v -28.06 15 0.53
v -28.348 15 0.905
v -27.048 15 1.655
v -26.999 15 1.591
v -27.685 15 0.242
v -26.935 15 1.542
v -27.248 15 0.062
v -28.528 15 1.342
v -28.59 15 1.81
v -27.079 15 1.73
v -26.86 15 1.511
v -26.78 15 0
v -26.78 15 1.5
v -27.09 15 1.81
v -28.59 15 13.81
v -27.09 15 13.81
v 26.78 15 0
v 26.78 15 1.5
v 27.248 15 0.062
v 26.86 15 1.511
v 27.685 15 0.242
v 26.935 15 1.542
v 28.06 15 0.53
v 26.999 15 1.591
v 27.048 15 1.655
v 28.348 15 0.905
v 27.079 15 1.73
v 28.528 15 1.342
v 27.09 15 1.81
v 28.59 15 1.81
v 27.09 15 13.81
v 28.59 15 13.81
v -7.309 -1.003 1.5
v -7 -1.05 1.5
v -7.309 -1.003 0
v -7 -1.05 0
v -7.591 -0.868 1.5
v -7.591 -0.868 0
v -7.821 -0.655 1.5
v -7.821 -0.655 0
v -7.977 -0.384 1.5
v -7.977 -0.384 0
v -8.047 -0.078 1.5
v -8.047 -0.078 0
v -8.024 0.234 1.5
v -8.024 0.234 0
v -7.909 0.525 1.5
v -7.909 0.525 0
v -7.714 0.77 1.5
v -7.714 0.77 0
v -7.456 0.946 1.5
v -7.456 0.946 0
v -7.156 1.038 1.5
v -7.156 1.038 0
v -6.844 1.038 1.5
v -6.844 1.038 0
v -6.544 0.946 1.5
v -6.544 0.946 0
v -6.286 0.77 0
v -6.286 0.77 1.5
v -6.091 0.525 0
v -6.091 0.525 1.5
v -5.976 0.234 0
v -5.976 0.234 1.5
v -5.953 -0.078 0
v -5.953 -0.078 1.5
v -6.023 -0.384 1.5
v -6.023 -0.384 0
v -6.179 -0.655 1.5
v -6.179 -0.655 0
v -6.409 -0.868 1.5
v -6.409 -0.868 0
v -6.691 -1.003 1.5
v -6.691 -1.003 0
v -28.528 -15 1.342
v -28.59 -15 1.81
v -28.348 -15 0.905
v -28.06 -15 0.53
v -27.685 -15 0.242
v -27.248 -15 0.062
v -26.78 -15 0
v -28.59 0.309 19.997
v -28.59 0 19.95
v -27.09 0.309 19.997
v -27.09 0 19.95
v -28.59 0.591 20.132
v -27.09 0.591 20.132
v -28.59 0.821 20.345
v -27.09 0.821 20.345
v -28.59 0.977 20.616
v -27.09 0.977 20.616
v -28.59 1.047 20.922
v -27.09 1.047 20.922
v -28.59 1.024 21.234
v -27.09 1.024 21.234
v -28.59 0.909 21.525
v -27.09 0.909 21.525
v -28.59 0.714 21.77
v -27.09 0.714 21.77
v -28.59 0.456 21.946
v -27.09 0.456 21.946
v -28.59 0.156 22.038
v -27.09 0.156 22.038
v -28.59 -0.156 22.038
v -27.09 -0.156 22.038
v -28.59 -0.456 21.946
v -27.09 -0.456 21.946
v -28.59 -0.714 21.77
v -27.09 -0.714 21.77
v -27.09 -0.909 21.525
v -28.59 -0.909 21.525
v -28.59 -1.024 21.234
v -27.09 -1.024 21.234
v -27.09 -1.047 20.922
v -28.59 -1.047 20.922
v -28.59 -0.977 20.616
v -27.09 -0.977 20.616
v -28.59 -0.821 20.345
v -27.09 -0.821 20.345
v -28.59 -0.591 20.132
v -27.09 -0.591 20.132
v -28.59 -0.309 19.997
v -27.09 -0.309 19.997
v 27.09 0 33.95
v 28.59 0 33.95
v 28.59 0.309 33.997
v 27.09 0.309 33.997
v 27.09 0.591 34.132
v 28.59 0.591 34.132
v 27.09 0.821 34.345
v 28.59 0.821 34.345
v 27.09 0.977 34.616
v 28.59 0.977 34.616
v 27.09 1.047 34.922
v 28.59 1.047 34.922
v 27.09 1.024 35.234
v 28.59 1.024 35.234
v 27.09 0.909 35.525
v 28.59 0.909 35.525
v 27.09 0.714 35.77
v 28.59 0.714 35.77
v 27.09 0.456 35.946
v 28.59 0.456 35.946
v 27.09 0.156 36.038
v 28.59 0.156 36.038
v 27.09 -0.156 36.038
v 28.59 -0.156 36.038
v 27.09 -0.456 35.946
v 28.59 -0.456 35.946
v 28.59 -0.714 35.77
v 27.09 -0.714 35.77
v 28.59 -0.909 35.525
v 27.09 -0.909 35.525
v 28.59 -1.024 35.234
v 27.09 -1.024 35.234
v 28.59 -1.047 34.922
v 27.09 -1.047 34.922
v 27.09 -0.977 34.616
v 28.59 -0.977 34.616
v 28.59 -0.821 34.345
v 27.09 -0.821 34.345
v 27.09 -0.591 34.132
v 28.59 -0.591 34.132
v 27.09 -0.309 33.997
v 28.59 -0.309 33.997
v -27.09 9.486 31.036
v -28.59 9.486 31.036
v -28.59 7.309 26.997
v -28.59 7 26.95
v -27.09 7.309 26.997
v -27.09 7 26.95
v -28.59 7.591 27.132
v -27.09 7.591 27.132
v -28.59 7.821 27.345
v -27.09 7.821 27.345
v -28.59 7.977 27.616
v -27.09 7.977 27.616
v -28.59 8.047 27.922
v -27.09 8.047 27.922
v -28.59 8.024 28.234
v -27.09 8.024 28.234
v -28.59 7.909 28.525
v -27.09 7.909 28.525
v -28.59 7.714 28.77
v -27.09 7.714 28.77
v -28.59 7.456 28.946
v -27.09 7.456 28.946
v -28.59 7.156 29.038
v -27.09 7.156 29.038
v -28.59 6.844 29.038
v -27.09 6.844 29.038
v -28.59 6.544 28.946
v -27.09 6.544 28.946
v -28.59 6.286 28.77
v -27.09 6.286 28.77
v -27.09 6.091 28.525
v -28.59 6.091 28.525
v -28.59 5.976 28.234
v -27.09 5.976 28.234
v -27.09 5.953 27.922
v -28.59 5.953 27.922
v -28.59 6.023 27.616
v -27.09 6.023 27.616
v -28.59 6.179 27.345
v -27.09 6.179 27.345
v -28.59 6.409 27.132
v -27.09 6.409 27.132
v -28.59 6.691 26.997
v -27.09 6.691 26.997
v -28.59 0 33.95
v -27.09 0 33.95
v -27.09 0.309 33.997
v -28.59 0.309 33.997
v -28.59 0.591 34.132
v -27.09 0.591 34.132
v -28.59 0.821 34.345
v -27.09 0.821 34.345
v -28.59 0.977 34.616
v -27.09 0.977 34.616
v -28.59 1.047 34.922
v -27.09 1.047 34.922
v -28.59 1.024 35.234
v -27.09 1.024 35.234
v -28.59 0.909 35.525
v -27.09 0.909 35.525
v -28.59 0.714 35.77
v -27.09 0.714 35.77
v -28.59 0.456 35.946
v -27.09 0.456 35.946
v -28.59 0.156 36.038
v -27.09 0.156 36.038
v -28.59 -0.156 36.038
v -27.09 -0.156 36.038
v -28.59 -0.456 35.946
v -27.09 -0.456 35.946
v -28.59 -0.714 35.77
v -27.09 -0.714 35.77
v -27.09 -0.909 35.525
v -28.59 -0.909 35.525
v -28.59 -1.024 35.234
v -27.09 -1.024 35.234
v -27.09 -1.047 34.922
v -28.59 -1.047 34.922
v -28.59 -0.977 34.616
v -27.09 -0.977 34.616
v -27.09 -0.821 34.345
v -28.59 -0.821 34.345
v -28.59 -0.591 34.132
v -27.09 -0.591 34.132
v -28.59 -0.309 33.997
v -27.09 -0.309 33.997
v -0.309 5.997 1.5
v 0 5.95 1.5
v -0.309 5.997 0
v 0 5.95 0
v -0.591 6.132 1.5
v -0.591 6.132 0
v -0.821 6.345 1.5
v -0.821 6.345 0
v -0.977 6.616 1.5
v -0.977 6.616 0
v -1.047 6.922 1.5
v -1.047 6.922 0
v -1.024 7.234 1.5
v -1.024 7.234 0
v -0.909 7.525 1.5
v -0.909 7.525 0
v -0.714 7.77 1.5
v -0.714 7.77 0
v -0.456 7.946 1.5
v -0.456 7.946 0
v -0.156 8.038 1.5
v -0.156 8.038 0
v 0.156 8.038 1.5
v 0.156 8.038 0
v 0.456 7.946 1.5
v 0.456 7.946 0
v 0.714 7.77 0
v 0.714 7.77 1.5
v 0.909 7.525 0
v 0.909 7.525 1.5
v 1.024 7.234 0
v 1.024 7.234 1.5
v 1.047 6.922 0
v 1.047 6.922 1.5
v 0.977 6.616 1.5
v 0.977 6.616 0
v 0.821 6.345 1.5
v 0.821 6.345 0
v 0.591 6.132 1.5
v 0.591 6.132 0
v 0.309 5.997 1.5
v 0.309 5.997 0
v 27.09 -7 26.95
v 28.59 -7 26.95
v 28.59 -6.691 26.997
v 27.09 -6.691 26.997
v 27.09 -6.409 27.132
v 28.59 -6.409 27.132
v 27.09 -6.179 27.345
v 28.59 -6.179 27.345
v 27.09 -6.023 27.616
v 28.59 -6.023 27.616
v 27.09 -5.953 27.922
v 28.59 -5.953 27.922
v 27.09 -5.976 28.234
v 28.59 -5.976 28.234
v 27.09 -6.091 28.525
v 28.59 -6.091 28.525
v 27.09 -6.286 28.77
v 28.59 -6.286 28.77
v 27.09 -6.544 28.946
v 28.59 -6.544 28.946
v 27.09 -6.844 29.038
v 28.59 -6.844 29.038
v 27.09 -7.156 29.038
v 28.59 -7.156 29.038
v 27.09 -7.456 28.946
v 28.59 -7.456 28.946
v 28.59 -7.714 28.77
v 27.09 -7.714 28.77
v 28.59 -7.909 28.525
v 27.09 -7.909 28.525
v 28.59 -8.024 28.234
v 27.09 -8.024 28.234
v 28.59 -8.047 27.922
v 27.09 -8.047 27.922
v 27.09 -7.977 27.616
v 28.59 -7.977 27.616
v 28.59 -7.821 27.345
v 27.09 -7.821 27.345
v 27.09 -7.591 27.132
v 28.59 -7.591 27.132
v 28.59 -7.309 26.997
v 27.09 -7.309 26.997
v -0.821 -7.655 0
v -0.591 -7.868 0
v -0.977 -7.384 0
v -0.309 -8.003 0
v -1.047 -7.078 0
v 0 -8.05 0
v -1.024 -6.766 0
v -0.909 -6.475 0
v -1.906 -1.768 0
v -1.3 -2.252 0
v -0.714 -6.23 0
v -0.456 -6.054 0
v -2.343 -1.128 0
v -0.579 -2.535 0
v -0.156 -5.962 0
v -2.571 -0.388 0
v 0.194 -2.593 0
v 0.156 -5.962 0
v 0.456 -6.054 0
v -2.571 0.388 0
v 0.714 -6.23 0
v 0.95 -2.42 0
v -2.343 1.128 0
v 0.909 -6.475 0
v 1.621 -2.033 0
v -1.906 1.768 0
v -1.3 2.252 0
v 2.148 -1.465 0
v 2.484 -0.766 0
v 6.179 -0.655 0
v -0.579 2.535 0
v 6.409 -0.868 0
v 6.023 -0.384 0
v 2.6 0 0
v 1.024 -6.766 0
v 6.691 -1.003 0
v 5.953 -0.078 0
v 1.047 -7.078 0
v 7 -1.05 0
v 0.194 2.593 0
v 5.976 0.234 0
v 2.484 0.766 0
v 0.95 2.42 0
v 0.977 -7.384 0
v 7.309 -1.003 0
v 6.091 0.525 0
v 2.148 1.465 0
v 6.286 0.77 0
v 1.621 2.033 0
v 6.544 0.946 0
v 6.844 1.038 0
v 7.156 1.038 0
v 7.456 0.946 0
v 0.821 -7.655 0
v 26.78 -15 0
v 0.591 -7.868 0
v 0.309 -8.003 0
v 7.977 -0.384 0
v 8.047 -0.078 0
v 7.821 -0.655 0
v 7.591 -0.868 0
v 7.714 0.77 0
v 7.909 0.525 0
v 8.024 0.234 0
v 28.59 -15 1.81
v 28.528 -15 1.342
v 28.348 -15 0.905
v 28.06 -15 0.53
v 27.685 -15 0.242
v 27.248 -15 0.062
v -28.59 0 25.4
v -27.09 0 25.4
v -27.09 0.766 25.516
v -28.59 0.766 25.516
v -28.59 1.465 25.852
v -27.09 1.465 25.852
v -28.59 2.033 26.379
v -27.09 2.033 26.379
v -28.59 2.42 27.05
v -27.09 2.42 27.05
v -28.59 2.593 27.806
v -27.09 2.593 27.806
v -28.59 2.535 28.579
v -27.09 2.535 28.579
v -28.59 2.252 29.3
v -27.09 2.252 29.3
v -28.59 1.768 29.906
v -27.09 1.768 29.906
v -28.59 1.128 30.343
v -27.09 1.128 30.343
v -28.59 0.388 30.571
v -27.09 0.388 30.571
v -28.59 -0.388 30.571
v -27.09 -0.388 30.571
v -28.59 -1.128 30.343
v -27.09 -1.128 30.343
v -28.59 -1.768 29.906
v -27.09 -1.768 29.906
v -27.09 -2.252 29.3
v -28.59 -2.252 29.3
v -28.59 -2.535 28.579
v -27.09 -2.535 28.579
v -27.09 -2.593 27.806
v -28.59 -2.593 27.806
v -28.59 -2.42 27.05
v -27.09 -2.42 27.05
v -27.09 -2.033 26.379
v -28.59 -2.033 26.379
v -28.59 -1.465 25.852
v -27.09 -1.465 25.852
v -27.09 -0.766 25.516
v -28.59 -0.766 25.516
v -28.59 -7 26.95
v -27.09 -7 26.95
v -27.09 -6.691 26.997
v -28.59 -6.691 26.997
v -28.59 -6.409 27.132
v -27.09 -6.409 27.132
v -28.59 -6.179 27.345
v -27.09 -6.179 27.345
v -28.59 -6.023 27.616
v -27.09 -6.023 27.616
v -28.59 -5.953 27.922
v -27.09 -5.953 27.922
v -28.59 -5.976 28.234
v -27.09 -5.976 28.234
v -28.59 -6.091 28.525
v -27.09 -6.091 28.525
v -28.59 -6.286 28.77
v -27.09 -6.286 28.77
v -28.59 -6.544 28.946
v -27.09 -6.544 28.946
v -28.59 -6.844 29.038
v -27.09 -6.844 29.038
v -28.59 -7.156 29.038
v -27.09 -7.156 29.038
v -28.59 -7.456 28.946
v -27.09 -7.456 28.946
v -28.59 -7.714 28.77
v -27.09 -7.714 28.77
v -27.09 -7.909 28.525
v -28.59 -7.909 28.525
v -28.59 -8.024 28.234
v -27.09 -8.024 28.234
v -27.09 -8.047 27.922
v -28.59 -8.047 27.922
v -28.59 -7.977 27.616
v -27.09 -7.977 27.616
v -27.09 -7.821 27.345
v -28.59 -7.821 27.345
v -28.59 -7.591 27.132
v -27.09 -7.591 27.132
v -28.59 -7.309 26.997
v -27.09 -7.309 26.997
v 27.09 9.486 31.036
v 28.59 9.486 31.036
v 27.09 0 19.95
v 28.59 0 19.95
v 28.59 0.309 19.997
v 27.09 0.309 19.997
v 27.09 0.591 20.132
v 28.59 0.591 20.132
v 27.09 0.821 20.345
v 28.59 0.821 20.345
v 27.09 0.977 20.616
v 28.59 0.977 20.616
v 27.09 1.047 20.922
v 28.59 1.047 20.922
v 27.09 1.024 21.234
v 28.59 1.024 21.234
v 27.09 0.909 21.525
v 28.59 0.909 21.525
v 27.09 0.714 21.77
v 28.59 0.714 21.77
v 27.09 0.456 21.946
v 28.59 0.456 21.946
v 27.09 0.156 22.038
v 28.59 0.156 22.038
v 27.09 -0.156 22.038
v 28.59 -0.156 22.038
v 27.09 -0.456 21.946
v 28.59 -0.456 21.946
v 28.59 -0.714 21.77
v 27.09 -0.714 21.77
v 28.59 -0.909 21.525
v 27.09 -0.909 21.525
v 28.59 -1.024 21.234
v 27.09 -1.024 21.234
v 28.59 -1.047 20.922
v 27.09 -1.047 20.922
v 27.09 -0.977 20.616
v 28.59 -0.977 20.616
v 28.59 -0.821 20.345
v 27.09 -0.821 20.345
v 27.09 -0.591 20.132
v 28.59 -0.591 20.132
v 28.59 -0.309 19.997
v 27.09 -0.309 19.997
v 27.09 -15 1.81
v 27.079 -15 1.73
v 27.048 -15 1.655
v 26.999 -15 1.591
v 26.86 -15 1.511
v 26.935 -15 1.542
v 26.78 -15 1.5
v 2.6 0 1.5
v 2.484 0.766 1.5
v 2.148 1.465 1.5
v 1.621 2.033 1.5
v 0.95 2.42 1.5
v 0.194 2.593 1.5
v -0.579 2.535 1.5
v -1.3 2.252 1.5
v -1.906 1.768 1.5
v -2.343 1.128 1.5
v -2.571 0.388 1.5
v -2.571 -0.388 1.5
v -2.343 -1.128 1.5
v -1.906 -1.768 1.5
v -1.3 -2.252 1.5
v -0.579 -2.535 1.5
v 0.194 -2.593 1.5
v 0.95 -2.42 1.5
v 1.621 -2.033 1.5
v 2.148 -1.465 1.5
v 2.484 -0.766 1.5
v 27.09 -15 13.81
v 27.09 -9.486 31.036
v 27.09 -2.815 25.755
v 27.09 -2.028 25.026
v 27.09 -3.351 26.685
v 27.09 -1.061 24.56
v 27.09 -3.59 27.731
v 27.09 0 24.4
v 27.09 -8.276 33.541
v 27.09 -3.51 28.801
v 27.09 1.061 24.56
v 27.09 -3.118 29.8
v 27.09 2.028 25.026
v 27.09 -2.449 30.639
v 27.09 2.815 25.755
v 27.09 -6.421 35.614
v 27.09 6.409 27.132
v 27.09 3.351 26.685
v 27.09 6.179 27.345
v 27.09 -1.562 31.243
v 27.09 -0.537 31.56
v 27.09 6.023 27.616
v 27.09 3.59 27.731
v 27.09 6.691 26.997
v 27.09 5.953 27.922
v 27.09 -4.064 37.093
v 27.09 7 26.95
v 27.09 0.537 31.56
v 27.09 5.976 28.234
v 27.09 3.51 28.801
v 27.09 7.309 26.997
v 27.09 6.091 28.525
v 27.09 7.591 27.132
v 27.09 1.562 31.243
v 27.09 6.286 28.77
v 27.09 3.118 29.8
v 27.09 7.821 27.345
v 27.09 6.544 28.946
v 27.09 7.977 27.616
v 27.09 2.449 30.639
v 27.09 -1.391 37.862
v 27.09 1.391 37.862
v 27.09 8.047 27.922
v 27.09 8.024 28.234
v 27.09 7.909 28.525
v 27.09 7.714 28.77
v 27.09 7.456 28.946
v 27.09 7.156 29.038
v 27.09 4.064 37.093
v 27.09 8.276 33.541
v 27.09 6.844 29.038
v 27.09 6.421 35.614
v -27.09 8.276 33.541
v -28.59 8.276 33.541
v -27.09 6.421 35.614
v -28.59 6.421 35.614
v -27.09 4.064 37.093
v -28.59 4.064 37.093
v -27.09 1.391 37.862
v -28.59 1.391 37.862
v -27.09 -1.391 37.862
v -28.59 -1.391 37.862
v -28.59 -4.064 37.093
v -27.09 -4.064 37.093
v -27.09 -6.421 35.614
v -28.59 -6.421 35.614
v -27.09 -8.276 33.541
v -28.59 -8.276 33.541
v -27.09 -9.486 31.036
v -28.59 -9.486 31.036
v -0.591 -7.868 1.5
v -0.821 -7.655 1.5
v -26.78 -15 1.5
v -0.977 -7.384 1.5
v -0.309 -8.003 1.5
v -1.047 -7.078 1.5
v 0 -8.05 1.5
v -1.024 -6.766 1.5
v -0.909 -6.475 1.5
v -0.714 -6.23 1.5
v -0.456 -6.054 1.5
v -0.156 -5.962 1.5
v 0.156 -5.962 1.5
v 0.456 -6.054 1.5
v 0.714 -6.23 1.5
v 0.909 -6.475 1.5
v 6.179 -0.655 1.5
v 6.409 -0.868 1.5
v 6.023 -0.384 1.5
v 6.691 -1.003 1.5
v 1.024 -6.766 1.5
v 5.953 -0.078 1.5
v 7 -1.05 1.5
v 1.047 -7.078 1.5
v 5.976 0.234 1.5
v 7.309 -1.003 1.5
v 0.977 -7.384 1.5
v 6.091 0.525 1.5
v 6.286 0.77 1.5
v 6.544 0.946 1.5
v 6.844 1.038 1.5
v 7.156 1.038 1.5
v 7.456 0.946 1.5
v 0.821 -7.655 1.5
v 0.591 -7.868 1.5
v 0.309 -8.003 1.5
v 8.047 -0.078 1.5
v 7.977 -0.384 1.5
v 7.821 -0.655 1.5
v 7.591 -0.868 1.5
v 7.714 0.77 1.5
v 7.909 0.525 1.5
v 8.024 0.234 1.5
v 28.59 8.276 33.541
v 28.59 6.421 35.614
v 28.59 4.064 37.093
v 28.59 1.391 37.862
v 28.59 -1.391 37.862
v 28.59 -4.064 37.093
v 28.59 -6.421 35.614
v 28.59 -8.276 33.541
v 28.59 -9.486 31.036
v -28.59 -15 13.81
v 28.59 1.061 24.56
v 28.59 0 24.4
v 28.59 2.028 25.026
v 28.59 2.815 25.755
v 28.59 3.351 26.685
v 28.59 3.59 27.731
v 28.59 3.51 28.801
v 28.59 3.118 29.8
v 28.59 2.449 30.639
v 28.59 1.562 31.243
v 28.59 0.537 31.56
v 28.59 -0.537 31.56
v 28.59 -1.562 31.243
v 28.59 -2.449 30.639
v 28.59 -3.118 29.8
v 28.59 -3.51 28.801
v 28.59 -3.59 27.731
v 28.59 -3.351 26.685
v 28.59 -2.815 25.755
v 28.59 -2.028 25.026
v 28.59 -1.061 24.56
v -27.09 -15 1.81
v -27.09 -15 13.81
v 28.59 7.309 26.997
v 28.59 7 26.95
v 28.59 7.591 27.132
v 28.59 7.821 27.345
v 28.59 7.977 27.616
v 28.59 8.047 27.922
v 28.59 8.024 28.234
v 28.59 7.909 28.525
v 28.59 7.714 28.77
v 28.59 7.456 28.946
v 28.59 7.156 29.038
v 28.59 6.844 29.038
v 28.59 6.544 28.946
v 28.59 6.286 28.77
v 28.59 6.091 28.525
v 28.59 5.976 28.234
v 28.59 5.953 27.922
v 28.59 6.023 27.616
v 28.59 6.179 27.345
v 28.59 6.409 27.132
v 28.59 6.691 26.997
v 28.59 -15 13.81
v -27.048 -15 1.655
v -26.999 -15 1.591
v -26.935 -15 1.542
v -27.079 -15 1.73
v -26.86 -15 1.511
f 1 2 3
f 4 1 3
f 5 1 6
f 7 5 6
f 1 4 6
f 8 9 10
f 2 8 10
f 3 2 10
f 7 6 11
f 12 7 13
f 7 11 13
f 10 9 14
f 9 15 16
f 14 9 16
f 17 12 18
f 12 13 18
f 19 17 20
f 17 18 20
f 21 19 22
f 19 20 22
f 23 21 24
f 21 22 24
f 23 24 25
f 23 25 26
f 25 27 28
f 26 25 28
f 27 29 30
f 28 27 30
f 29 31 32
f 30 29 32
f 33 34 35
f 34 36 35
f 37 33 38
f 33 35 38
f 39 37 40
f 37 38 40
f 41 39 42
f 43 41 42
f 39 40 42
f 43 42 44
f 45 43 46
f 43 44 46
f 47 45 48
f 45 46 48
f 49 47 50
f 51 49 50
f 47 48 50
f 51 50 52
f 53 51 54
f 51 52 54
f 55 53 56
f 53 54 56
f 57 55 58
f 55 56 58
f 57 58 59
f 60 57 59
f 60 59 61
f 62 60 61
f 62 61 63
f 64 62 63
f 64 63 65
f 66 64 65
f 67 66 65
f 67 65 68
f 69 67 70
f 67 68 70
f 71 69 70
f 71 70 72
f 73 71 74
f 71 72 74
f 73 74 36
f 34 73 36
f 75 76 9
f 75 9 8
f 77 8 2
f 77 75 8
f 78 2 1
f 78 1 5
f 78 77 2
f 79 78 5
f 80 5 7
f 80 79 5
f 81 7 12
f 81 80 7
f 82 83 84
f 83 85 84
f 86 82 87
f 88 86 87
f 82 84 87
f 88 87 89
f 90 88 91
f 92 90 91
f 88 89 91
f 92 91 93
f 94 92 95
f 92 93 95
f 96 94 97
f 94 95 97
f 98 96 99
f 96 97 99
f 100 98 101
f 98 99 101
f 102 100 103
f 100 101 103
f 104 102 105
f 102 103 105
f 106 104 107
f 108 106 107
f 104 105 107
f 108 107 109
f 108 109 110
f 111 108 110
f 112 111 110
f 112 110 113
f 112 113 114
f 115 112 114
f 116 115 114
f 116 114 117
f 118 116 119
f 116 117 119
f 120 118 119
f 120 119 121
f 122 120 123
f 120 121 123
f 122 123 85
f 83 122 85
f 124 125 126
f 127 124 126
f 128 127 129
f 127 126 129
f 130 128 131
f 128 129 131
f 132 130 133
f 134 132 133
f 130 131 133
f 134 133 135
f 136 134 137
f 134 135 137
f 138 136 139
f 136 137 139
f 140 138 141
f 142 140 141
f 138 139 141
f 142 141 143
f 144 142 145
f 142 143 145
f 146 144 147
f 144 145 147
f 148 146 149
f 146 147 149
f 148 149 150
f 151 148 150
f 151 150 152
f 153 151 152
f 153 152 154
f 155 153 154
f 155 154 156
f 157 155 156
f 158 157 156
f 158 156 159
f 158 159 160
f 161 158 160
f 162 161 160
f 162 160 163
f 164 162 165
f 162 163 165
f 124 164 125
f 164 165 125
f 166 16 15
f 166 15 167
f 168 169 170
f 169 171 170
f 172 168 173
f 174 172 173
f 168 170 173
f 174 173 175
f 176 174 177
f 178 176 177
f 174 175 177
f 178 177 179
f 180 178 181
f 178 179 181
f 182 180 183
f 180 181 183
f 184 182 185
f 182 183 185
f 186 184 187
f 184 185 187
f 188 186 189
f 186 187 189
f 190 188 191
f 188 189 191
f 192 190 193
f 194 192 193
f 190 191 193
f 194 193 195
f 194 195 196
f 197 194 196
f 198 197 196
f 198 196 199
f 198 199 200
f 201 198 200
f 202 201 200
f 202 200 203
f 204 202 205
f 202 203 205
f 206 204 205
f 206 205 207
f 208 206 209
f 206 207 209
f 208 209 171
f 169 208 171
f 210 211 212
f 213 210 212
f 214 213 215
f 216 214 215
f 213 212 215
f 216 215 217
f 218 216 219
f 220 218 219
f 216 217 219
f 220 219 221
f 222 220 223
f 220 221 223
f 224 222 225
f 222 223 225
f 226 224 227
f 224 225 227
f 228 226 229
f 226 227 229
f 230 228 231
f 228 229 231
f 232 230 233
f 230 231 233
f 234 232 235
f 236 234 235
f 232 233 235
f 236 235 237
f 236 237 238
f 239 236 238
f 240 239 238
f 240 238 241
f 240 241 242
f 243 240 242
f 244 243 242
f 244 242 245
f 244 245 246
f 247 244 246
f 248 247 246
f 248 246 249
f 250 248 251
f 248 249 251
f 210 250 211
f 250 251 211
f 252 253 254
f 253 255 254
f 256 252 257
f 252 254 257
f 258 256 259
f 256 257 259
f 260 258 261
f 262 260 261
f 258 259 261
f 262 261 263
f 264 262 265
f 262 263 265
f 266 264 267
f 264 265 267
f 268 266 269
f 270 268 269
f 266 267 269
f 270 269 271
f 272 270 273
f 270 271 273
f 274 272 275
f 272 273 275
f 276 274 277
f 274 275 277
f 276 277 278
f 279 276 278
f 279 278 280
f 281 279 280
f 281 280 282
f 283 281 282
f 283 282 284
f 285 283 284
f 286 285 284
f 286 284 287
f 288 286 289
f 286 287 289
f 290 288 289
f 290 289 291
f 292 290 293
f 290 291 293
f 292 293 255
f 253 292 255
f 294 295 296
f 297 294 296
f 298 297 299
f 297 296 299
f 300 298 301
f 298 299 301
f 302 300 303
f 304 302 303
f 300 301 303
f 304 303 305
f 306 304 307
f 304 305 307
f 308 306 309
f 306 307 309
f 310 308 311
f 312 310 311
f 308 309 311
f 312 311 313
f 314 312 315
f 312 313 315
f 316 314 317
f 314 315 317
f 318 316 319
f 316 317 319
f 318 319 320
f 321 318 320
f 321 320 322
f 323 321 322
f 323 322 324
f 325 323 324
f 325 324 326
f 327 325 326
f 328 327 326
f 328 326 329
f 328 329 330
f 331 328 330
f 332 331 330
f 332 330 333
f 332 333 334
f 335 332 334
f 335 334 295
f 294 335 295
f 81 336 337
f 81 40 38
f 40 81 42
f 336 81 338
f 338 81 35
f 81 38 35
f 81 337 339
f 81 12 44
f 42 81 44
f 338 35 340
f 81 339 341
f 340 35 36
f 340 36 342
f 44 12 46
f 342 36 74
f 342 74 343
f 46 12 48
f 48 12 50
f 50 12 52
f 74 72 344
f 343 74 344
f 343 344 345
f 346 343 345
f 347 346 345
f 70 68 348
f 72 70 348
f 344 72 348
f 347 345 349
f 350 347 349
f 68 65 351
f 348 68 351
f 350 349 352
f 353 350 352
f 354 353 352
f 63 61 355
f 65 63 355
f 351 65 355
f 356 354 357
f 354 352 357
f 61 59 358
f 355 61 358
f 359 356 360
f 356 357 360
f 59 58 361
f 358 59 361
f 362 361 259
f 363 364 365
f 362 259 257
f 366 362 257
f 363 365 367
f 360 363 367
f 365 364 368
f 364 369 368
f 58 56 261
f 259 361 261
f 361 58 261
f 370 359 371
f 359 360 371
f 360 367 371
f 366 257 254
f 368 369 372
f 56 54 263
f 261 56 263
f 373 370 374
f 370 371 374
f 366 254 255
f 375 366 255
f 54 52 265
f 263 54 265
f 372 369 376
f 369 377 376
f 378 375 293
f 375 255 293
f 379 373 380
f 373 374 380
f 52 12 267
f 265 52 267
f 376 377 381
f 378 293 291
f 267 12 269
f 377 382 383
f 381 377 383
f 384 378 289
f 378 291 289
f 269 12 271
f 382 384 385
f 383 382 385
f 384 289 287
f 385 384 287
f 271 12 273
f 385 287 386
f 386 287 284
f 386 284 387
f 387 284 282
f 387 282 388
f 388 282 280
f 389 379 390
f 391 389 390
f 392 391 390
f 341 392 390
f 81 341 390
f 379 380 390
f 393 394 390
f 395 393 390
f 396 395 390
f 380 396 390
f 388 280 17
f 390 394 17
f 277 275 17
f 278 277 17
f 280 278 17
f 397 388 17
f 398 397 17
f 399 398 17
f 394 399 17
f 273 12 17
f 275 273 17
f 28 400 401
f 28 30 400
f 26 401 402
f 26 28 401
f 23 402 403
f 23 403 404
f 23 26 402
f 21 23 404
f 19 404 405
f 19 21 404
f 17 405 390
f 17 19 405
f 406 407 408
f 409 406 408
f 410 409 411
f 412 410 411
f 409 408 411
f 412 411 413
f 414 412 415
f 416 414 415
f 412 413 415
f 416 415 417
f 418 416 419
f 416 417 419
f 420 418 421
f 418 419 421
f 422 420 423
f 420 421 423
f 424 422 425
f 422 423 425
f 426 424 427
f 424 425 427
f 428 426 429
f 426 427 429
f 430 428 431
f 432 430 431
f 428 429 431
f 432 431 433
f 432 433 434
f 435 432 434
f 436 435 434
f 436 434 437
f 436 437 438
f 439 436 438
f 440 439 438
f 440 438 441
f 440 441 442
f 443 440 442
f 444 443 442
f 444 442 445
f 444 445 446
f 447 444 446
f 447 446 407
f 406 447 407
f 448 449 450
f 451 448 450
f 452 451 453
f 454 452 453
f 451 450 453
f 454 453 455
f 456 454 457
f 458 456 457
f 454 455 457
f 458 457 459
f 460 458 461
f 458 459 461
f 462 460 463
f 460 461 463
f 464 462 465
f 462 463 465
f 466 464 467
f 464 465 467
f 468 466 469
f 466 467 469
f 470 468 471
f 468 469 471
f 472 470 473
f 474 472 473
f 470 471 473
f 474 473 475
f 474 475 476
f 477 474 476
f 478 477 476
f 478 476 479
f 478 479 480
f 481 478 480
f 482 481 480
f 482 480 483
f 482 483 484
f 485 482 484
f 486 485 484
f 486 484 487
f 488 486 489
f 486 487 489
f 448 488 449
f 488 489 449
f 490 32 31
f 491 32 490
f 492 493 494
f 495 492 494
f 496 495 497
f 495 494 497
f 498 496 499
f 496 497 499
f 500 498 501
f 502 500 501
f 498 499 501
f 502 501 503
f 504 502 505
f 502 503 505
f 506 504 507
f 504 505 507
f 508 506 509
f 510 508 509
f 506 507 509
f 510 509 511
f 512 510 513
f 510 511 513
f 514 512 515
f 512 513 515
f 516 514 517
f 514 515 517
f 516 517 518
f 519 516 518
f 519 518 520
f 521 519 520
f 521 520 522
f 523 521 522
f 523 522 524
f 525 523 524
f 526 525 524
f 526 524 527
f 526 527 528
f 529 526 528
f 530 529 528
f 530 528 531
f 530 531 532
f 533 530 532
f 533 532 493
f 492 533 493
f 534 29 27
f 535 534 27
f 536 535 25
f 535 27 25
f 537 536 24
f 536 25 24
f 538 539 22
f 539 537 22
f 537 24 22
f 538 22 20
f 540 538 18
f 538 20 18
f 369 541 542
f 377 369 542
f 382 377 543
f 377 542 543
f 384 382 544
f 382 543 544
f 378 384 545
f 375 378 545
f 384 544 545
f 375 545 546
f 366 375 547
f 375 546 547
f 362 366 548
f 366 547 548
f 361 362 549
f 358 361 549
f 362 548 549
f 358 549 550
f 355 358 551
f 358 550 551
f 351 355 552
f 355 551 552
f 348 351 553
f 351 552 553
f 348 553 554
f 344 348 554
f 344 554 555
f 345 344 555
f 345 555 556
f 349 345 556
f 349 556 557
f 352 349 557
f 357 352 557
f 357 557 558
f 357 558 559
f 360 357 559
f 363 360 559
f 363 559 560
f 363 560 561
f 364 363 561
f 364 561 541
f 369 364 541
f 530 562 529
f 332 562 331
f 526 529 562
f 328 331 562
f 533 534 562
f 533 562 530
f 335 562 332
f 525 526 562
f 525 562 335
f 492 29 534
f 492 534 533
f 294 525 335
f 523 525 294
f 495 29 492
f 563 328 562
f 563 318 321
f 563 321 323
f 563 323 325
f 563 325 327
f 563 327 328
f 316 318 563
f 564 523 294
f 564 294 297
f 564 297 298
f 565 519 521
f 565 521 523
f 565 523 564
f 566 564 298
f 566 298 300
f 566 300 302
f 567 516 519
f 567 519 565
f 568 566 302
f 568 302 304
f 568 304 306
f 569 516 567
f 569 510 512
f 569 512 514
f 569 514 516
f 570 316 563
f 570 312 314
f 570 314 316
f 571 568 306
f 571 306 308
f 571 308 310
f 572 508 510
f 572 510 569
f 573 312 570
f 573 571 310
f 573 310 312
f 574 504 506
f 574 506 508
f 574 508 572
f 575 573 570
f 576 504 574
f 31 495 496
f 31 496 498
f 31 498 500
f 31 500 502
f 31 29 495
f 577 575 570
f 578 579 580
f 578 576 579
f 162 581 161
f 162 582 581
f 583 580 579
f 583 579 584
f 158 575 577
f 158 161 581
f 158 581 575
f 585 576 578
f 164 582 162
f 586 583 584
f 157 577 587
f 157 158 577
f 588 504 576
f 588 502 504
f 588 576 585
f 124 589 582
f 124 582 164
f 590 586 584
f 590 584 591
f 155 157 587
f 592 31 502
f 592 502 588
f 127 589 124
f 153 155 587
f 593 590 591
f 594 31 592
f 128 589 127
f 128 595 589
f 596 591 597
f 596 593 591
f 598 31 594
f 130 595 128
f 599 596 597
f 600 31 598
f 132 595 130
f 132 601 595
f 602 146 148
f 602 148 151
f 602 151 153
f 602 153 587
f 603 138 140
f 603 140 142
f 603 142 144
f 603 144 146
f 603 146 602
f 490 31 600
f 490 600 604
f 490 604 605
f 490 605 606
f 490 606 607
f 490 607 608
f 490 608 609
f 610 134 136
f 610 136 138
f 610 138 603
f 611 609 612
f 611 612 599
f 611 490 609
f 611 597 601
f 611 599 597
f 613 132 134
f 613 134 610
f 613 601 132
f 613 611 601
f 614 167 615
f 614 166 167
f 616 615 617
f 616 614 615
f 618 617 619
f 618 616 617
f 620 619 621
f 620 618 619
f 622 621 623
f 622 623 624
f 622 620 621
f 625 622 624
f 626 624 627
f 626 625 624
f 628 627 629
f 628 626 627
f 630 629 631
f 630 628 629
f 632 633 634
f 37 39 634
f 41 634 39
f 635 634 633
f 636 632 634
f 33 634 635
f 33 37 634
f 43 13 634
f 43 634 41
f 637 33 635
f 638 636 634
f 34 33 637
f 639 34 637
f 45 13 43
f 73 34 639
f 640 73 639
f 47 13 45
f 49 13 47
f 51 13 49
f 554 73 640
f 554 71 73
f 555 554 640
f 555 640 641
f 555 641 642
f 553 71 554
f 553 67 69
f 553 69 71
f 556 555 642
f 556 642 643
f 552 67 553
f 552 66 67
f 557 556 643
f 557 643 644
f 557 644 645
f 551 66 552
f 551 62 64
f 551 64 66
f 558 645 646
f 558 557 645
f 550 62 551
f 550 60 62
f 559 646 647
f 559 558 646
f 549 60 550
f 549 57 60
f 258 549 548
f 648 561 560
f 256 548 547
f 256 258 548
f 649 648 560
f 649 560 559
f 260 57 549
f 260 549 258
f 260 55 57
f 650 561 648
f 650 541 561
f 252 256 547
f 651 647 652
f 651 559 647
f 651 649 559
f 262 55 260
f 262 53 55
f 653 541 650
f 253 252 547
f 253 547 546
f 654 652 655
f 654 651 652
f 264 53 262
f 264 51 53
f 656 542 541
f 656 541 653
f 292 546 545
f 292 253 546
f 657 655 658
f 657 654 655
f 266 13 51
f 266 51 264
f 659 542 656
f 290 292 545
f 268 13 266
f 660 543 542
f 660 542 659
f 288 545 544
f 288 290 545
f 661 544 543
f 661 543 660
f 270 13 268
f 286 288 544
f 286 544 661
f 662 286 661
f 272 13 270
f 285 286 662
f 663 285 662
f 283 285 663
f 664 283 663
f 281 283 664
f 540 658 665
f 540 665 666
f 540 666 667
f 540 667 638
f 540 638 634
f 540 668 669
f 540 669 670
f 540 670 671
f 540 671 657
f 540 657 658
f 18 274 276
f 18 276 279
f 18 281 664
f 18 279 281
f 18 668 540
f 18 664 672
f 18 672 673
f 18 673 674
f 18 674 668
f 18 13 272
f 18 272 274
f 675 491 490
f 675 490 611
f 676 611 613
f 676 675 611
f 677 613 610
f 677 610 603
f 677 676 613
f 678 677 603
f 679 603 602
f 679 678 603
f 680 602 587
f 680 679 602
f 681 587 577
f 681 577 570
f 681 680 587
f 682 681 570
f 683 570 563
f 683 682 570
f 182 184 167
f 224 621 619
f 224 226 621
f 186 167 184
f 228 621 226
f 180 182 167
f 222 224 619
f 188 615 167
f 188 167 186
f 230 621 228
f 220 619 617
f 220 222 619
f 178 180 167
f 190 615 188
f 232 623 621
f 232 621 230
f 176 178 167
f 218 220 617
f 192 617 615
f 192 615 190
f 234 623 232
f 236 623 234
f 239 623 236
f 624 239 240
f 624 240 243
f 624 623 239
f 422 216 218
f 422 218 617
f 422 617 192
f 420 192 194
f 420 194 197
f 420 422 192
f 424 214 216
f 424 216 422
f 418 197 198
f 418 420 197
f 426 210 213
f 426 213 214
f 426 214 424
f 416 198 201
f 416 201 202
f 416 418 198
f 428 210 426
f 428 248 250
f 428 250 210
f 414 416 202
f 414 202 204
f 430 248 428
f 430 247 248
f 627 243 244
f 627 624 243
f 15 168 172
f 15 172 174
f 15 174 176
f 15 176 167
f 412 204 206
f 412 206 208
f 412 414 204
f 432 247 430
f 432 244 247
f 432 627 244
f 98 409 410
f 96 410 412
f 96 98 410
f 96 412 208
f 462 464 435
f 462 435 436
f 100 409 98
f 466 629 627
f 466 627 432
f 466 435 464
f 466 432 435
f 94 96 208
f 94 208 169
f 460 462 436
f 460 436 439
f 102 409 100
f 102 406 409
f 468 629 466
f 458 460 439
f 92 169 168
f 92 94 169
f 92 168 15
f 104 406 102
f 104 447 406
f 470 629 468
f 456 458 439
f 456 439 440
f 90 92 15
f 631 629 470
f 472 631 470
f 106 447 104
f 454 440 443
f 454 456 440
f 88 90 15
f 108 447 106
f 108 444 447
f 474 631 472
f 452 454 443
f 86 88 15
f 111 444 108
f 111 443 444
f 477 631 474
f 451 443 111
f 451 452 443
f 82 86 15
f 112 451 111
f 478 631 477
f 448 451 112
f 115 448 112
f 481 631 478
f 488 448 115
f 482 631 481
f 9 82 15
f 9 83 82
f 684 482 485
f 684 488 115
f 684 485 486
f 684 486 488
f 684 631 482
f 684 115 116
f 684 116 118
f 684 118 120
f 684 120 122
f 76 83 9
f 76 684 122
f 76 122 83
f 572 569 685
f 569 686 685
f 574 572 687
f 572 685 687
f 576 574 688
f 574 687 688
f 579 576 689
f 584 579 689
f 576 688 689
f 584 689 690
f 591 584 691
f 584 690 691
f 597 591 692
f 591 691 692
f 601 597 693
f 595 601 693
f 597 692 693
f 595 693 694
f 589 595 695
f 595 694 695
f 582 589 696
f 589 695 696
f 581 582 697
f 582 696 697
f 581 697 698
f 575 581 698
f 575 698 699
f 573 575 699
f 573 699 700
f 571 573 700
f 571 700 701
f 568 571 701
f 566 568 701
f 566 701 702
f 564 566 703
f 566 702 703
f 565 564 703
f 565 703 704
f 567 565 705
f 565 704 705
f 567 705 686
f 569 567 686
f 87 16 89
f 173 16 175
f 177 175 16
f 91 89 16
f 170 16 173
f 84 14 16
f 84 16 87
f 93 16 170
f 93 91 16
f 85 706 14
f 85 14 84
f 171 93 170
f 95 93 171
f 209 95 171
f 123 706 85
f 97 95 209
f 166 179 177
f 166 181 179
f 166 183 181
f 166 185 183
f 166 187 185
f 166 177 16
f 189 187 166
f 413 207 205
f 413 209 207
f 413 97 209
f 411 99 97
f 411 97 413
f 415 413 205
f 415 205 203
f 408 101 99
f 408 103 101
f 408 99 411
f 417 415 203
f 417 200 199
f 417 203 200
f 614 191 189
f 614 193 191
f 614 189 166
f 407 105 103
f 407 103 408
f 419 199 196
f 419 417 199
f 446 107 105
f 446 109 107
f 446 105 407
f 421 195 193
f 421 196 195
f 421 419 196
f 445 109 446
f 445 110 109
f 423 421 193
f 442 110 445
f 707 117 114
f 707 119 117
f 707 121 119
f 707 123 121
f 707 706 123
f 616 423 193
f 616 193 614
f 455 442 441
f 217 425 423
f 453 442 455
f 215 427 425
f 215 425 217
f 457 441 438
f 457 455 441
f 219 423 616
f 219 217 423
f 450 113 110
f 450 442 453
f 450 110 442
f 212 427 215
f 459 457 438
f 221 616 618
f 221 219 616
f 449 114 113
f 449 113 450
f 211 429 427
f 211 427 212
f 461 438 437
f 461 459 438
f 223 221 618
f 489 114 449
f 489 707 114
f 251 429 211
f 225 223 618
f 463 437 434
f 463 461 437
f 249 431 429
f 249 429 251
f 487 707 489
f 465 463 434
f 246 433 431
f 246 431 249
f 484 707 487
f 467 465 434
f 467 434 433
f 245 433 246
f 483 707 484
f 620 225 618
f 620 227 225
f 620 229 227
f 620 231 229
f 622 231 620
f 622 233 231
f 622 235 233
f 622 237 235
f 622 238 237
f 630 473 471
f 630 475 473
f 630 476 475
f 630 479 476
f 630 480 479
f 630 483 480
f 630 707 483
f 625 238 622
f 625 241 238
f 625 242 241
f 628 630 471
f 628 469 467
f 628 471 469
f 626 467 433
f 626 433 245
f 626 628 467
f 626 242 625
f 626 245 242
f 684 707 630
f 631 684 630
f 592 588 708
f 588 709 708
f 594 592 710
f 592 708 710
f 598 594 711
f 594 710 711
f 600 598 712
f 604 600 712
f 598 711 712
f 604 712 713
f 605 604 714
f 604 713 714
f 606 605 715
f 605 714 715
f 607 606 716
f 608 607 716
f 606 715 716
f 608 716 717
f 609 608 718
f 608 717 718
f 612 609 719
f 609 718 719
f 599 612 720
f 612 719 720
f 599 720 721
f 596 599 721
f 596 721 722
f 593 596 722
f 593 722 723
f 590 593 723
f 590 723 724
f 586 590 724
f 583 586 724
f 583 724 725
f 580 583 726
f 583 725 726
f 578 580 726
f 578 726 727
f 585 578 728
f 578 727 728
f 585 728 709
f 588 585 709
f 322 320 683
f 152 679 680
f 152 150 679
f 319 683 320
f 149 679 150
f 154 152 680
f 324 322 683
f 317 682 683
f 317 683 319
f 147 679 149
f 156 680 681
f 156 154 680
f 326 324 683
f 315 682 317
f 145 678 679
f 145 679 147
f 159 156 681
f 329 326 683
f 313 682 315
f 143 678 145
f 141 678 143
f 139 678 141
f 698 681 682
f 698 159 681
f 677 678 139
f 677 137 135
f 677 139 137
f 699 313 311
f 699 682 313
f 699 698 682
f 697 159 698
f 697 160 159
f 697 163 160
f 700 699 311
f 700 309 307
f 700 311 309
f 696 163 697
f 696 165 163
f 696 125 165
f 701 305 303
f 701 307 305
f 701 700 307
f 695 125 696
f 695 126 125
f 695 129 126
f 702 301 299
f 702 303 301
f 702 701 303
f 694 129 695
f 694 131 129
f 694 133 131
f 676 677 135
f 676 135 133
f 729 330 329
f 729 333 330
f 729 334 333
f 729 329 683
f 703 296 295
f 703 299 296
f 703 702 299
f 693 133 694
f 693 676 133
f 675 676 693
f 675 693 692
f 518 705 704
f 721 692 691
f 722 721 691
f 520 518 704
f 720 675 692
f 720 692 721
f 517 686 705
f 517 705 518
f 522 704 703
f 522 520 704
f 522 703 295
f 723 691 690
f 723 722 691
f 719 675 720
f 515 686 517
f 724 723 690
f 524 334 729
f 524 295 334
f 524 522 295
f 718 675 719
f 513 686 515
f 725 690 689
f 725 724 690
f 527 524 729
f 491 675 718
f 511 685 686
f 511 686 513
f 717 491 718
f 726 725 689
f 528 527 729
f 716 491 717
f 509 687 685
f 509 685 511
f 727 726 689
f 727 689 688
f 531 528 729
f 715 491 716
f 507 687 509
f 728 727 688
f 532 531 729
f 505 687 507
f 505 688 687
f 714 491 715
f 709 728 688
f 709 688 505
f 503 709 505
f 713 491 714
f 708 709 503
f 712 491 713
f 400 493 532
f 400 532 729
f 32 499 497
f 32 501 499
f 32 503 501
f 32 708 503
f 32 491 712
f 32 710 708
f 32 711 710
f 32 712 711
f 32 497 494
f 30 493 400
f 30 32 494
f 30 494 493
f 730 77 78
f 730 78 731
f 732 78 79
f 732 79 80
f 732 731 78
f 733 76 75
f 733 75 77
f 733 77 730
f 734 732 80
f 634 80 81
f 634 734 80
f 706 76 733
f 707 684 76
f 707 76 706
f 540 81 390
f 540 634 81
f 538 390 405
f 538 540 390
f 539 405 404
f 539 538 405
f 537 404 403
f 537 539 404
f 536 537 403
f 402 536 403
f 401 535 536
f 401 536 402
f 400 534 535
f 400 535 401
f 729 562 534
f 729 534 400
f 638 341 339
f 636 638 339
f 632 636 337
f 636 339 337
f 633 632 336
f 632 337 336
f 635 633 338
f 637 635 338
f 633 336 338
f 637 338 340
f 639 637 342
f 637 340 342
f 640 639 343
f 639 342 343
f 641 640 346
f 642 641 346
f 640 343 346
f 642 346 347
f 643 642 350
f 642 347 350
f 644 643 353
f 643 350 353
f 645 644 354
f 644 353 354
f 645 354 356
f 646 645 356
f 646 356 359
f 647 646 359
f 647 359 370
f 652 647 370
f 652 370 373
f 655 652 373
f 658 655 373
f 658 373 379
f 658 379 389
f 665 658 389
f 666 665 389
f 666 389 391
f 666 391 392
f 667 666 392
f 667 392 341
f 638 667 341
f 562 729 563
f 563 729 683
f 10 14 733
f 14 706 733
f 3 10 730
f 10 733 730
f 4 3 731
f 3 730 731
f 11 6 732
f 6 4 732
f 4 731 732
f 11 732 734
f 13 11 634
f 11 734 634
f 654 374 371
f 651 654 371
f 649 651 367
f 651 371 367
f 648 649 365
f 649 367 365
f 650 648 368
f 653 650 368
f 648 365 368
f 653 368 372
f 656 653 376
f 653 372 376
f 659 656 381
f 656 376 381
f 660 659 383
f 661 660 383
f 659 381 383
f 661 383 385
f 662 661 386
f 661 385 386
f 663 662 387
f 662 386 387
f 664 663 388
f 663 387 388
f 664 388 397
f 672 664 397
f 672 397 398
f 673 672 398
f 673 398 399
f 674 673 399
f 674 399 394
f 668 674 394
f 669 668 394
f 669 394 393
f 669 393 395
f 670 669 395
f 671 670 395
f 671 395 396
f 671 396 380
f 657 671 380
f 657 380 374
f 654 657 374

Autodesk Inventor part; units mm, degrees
ref_plane "YZ Plane" through (0, 0, 0) normal (1, 0, 0) x (0, 1, 0)
ref_plane "XZ Plane" through (0, 0, 0) normal (0, 1, 0) x (-1, 0, 0)
ref_plane "XY Plane" through (0, 0, 0) normal (0, 0, 1) x (1, 0, 0)
sketch "Sketch1" plane through (0, 0, 0) normal (0, 0, 1) x (1, 0, 0)
  line L0 (-28.59, -15) -> (28.59, -15)
  line L1 (28.59, -15) -> (28.59, 15)
  line L2 (28.59, 15) -> (-28.59, 15)
  line L3 (-28.59, 15) -> (-28.59, -15)
  line L4 (-28.59, -15) -> (28.59, 15) construction
  line L5 (28.59, -15) -> (-28.59, 15) construction
  point P0 (0, 0)
  dimension "d0" = 57.18
  dimension "d1" = 30
extrude "Plate1" add sketch "Sketch1" along normal blind 1.5
sketch "Sketch2" plane through (-27.09, -15, 0) normal (-1, 0, 0) x (0, -1, 0)
  line L0 (-30, 0) -> (0, 0)
  line L1 (0, 0) -> (0, 45)
  line L2 (0, 45) -> (-30, 45)
  line L3 (-30, 45) -> (-30, 0)
edge flange "Flange1" height 45 angle 90 thickness 1.5 bend radius 0.31 thickness toward (-1, 0, 0) relief tear relief width 1.5 relief depth 0.75 corner gap 0.31 corner form 0 edges at (-28.59, 0, 1.5) (28.59, 0, 1.5) wall of the first edge with corners at (-27.09, 15, 0) (-27.09, -15, 0) (-27.09, -15, 45) (-27.09, 15, 45)
bend "Bend1"
corner "Corner1"
sketch "Sketch3" plane through (28.59, -15, 45) normal (1, 0, 0) x (0, 0, -1)
  circle A0 centre (17, 15) radius 9.96
  line L0 (0, 30) -> (43.19, 30) projected
  line L1 (43.19, 0) -> (0, 0) projected
  line L2 (31.19, 30) -> (13.9636, 24.4859)
  line L3 (31.19, 0) -> (13.9636, 5.5141)
  line L4 (0, 30) -> (0, 0)
  point P0 (45, 15)
  dimension "d13" = 19.92
  dimension "d14" = 12
  dimension "d15" = 28
extrude "Cut1" cut sketch "Sketch3" against normal blind 57.18 contours A0 L3 L1 L4 L0 L2
sketch "Sketch4" plane through (0, 0, 1.5) normal (0, 0, 1) x (1, 0, 0)
  circle A0 centre (7, 0) radius 0.7835 projected
  circle A1 centre (0, -7) radius 0.7835 projected
  circle A2 centre (-7, 0) radius 0.7835 projected
  circle A3 centre (0, 7) radius 0.7835 projected
  circle A4 centre (0, 0) radius 2.925 projected
hole "Hole1" at (7, 0, 1.5) at (0, 7, 1.5) at (-7, 0, 1.5) at (0, -7, 1.5) direction (0, 0, -1) diameter 2.1 depth 1.5
sketch "Sketch5" plane through (0, 0, 1.5) normal (0, 0, 1) x (1, 0, 0)
  circle A0 centre (0, 0) radius 1.75 projected
  circle A1 centre (0, 0) radius 2.6
  point P0 (0, 0)
  dimension "d26" = 5.2
extrude "Extrusion1" cut sketch "Sketch5" against normal through all contours A0 | A1
sketch "Sketch12" plane through (28.59, -15, 1.81) normal (1, 0, 0) x (0, 0, -1)
  arc A0 (-29.2264, 24.4859) -> (-29.2264, 5.5141) centre (-26.19, 15) ccw projected
  circle A1 centre (-26.19, 15) radius 2.6
  circle A2 centre (-33.19, 15) radius 1.05
  circle A3 centre (-26.19, 8) radius 1.05
  circle A4 centre (-19.19, 15) radius 1.05
  circle A5 centre (-26.19, 22) radius 1.05
  point P0 (1.81, 15)
  dimension "d52" = 5.2
  dimension "d53" = 2.1
  dimension "d54" = 7
  dimension "d57" = 360
extrude "Cut5" cut sketch "Sketch12" against normal blind 57.18
sketch "Sketch13" plane through (28.59, -15, 1.81) normal (1, 0, 0) x (0, 0, -1)
  circle A0 centre (-26.19, 15) radius 2.6 projected
  circle A1 centre (-26.19, 15) radius 3.6
  point P0 (1.81, 15)
  dimension "d61" = 7.2
extrude "Cut6" cut sketch "Sketch13" against normal blind 1.5
equation "\"d24\" = Thickness"
equation "\"d62\" = Thickness"
equation "\"d2\" = Thickness"
equation "\"d3\" = BendReliefWidth"
equation "\"d4\" = BendReliefDepth"
equation "\"d5\" = MinimumRemnant"
equation "\"d6\" = TransitionRadius"
equation "\"d9\" = BendRadius"
equation "\"d10\" = CornerReliefSize"
equation "\"d11\" = GapSize"
equation "\"d12\" = JacobiRadiusSize"
equation "\"BendReliefWidth\" = Thickness"
equation "\"BendReliefDepth\" = 0.5 * Thickness"
equation "\"CornerReliefSize\" = 4 * Thickness"
equation "\"MinimumRemnant\" = 2 * Thickness"
equation "\"TransitionRadius\" = BendRadius"
equation "\"JacobiRadiusSize\" = BendRadius"
equation "\"GapSize\" = Thickness"
equation "\"Thickness\" = 1.5"
equation "\"BendRadius\" = 0.31"
properties part number "axis_5_bottom_frame" material "Aluminum 6061-AHC"
